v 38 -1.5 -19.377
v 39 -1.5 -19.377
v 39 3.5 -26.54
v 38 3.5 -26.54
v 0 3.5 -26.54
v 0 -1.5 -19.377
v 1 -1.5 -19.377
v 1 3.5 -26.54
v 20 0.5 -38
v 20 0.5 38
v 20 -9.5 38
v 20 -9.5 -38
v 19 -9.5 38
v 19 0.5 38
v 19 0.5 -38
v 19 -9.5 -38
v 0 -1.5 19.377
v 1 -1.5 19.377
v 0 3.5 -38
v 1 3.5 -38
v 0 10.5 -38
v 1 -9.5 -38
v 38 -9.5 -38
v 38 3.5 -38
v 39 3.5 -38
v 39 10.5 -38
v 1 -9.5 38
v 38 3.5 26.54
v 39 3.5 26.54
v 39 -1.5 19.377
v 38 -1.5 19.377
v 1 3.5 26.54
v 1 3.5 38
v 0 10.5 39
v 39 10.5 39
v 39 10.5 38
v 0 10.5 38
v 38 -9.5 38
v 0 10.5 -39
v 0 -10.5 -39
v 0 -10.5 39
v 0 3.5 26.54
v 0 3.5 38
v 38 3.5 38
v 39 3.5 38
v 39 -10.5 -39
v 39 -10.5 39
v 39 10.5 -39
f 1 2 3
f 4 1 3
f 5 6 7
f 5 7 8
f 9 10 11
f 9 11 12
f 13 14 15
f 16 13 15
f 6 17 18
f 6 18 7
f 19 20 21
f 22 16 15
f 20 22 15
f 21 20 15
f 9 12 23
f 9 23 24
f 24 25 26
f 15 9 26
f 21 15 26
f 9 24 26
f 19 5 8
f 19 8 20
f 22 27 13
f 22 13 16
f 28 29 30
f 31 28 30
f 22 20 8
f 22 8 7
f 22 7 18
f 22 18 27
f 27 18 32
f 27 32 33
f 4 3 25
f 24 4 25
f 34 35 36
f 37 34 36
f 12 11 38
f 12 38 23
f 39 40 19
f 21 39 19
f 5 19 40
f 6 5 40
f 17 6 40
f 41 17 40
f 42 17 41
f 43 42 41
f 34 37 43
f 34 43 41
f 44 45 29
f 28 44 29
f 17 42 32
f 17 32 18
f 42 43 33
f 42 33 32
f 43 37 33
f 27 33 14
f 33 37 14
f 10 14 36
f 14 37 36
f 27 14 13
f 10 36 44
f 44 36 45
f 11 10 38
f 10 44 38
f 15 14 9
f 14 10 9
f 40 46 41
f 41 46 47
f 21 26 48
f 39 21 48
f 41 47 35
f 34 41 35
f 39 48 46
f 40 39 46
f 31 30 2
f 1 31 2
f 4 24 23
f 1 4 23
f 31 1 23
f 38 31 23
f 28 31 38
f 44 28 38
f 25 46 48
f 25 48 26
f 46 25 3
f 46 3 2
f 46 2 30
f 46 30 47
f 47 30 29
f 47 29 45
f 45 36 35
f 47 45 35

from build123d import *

# Parameters (mm, degrees)
BOSS_EXTRUDE1_DEPTH = 1
BOSS_EXTRUDE2_DEPTH = 37
SKETCH4_W           = 76
SKETCH4_H           = 10
BOSS_EXTRUDE3_DEPTH = 0.5


with BuildPart() as part:
    # Sketch1 → Boss-Extrude1 (new body)
    with BuildSketch(Plane(origin=(0, 0, 0), x_dir=(0, 0, -1), z_dir=(1, 0, 0))):
        Polygon((-39, 10.5), (-38, 10.5), (-38, 3.5), (-26.539616882, 3.5), (-19.376877433, -1.5), (19.376877433, -1.5), (26.539616882, 3.5), (38, 3.5), (38, 10.5), (39, 10.5), (39, -10.5), (-39, -10.5), align=None)
    boss_extrude1 = extrude(amount=BOSS_EXTRUDE1_DEPTH)

    # Sketch2 → Boss-Extrude2 (add)
    with BuildSketch(Plane(origin=(1, 0, 0), x_dir=(0, 0, -1), z_dir=(1, 0, 0))):
        Polygon((-38, 10.5), (-38, -9.5), (38, -9.5), (38, 10.5), (39, 10.5), (39, -10.5), (-39, -10.5), (-39, 10.5), align=None)
    extrude(amount=BOSS_EXTRUDE2_DEPTH)

    # Mirror1: Boss-Extrude1 across plane
    add(boss_extrude1.mirror(Plane(origin=(19.5, 0, 0), x_dir=(0, 0, 1), z_dir=(1, 0, 0))))

    # Sketch4 → Boss-Extrude3 (add, symmetric)
    with BuildSketch(Plane(origin=(19.5, 0, 0), x_dir=(0, 0, -1), z_dir=(1, 0, 0))):
        with Locations((0, -4.5)):
            Rectangle(SKETCH4_W, SKETCH4_H)
    extrude(amount=BOSS_EXTRUDE3_DEPTH, both=True)


solid = part.part
